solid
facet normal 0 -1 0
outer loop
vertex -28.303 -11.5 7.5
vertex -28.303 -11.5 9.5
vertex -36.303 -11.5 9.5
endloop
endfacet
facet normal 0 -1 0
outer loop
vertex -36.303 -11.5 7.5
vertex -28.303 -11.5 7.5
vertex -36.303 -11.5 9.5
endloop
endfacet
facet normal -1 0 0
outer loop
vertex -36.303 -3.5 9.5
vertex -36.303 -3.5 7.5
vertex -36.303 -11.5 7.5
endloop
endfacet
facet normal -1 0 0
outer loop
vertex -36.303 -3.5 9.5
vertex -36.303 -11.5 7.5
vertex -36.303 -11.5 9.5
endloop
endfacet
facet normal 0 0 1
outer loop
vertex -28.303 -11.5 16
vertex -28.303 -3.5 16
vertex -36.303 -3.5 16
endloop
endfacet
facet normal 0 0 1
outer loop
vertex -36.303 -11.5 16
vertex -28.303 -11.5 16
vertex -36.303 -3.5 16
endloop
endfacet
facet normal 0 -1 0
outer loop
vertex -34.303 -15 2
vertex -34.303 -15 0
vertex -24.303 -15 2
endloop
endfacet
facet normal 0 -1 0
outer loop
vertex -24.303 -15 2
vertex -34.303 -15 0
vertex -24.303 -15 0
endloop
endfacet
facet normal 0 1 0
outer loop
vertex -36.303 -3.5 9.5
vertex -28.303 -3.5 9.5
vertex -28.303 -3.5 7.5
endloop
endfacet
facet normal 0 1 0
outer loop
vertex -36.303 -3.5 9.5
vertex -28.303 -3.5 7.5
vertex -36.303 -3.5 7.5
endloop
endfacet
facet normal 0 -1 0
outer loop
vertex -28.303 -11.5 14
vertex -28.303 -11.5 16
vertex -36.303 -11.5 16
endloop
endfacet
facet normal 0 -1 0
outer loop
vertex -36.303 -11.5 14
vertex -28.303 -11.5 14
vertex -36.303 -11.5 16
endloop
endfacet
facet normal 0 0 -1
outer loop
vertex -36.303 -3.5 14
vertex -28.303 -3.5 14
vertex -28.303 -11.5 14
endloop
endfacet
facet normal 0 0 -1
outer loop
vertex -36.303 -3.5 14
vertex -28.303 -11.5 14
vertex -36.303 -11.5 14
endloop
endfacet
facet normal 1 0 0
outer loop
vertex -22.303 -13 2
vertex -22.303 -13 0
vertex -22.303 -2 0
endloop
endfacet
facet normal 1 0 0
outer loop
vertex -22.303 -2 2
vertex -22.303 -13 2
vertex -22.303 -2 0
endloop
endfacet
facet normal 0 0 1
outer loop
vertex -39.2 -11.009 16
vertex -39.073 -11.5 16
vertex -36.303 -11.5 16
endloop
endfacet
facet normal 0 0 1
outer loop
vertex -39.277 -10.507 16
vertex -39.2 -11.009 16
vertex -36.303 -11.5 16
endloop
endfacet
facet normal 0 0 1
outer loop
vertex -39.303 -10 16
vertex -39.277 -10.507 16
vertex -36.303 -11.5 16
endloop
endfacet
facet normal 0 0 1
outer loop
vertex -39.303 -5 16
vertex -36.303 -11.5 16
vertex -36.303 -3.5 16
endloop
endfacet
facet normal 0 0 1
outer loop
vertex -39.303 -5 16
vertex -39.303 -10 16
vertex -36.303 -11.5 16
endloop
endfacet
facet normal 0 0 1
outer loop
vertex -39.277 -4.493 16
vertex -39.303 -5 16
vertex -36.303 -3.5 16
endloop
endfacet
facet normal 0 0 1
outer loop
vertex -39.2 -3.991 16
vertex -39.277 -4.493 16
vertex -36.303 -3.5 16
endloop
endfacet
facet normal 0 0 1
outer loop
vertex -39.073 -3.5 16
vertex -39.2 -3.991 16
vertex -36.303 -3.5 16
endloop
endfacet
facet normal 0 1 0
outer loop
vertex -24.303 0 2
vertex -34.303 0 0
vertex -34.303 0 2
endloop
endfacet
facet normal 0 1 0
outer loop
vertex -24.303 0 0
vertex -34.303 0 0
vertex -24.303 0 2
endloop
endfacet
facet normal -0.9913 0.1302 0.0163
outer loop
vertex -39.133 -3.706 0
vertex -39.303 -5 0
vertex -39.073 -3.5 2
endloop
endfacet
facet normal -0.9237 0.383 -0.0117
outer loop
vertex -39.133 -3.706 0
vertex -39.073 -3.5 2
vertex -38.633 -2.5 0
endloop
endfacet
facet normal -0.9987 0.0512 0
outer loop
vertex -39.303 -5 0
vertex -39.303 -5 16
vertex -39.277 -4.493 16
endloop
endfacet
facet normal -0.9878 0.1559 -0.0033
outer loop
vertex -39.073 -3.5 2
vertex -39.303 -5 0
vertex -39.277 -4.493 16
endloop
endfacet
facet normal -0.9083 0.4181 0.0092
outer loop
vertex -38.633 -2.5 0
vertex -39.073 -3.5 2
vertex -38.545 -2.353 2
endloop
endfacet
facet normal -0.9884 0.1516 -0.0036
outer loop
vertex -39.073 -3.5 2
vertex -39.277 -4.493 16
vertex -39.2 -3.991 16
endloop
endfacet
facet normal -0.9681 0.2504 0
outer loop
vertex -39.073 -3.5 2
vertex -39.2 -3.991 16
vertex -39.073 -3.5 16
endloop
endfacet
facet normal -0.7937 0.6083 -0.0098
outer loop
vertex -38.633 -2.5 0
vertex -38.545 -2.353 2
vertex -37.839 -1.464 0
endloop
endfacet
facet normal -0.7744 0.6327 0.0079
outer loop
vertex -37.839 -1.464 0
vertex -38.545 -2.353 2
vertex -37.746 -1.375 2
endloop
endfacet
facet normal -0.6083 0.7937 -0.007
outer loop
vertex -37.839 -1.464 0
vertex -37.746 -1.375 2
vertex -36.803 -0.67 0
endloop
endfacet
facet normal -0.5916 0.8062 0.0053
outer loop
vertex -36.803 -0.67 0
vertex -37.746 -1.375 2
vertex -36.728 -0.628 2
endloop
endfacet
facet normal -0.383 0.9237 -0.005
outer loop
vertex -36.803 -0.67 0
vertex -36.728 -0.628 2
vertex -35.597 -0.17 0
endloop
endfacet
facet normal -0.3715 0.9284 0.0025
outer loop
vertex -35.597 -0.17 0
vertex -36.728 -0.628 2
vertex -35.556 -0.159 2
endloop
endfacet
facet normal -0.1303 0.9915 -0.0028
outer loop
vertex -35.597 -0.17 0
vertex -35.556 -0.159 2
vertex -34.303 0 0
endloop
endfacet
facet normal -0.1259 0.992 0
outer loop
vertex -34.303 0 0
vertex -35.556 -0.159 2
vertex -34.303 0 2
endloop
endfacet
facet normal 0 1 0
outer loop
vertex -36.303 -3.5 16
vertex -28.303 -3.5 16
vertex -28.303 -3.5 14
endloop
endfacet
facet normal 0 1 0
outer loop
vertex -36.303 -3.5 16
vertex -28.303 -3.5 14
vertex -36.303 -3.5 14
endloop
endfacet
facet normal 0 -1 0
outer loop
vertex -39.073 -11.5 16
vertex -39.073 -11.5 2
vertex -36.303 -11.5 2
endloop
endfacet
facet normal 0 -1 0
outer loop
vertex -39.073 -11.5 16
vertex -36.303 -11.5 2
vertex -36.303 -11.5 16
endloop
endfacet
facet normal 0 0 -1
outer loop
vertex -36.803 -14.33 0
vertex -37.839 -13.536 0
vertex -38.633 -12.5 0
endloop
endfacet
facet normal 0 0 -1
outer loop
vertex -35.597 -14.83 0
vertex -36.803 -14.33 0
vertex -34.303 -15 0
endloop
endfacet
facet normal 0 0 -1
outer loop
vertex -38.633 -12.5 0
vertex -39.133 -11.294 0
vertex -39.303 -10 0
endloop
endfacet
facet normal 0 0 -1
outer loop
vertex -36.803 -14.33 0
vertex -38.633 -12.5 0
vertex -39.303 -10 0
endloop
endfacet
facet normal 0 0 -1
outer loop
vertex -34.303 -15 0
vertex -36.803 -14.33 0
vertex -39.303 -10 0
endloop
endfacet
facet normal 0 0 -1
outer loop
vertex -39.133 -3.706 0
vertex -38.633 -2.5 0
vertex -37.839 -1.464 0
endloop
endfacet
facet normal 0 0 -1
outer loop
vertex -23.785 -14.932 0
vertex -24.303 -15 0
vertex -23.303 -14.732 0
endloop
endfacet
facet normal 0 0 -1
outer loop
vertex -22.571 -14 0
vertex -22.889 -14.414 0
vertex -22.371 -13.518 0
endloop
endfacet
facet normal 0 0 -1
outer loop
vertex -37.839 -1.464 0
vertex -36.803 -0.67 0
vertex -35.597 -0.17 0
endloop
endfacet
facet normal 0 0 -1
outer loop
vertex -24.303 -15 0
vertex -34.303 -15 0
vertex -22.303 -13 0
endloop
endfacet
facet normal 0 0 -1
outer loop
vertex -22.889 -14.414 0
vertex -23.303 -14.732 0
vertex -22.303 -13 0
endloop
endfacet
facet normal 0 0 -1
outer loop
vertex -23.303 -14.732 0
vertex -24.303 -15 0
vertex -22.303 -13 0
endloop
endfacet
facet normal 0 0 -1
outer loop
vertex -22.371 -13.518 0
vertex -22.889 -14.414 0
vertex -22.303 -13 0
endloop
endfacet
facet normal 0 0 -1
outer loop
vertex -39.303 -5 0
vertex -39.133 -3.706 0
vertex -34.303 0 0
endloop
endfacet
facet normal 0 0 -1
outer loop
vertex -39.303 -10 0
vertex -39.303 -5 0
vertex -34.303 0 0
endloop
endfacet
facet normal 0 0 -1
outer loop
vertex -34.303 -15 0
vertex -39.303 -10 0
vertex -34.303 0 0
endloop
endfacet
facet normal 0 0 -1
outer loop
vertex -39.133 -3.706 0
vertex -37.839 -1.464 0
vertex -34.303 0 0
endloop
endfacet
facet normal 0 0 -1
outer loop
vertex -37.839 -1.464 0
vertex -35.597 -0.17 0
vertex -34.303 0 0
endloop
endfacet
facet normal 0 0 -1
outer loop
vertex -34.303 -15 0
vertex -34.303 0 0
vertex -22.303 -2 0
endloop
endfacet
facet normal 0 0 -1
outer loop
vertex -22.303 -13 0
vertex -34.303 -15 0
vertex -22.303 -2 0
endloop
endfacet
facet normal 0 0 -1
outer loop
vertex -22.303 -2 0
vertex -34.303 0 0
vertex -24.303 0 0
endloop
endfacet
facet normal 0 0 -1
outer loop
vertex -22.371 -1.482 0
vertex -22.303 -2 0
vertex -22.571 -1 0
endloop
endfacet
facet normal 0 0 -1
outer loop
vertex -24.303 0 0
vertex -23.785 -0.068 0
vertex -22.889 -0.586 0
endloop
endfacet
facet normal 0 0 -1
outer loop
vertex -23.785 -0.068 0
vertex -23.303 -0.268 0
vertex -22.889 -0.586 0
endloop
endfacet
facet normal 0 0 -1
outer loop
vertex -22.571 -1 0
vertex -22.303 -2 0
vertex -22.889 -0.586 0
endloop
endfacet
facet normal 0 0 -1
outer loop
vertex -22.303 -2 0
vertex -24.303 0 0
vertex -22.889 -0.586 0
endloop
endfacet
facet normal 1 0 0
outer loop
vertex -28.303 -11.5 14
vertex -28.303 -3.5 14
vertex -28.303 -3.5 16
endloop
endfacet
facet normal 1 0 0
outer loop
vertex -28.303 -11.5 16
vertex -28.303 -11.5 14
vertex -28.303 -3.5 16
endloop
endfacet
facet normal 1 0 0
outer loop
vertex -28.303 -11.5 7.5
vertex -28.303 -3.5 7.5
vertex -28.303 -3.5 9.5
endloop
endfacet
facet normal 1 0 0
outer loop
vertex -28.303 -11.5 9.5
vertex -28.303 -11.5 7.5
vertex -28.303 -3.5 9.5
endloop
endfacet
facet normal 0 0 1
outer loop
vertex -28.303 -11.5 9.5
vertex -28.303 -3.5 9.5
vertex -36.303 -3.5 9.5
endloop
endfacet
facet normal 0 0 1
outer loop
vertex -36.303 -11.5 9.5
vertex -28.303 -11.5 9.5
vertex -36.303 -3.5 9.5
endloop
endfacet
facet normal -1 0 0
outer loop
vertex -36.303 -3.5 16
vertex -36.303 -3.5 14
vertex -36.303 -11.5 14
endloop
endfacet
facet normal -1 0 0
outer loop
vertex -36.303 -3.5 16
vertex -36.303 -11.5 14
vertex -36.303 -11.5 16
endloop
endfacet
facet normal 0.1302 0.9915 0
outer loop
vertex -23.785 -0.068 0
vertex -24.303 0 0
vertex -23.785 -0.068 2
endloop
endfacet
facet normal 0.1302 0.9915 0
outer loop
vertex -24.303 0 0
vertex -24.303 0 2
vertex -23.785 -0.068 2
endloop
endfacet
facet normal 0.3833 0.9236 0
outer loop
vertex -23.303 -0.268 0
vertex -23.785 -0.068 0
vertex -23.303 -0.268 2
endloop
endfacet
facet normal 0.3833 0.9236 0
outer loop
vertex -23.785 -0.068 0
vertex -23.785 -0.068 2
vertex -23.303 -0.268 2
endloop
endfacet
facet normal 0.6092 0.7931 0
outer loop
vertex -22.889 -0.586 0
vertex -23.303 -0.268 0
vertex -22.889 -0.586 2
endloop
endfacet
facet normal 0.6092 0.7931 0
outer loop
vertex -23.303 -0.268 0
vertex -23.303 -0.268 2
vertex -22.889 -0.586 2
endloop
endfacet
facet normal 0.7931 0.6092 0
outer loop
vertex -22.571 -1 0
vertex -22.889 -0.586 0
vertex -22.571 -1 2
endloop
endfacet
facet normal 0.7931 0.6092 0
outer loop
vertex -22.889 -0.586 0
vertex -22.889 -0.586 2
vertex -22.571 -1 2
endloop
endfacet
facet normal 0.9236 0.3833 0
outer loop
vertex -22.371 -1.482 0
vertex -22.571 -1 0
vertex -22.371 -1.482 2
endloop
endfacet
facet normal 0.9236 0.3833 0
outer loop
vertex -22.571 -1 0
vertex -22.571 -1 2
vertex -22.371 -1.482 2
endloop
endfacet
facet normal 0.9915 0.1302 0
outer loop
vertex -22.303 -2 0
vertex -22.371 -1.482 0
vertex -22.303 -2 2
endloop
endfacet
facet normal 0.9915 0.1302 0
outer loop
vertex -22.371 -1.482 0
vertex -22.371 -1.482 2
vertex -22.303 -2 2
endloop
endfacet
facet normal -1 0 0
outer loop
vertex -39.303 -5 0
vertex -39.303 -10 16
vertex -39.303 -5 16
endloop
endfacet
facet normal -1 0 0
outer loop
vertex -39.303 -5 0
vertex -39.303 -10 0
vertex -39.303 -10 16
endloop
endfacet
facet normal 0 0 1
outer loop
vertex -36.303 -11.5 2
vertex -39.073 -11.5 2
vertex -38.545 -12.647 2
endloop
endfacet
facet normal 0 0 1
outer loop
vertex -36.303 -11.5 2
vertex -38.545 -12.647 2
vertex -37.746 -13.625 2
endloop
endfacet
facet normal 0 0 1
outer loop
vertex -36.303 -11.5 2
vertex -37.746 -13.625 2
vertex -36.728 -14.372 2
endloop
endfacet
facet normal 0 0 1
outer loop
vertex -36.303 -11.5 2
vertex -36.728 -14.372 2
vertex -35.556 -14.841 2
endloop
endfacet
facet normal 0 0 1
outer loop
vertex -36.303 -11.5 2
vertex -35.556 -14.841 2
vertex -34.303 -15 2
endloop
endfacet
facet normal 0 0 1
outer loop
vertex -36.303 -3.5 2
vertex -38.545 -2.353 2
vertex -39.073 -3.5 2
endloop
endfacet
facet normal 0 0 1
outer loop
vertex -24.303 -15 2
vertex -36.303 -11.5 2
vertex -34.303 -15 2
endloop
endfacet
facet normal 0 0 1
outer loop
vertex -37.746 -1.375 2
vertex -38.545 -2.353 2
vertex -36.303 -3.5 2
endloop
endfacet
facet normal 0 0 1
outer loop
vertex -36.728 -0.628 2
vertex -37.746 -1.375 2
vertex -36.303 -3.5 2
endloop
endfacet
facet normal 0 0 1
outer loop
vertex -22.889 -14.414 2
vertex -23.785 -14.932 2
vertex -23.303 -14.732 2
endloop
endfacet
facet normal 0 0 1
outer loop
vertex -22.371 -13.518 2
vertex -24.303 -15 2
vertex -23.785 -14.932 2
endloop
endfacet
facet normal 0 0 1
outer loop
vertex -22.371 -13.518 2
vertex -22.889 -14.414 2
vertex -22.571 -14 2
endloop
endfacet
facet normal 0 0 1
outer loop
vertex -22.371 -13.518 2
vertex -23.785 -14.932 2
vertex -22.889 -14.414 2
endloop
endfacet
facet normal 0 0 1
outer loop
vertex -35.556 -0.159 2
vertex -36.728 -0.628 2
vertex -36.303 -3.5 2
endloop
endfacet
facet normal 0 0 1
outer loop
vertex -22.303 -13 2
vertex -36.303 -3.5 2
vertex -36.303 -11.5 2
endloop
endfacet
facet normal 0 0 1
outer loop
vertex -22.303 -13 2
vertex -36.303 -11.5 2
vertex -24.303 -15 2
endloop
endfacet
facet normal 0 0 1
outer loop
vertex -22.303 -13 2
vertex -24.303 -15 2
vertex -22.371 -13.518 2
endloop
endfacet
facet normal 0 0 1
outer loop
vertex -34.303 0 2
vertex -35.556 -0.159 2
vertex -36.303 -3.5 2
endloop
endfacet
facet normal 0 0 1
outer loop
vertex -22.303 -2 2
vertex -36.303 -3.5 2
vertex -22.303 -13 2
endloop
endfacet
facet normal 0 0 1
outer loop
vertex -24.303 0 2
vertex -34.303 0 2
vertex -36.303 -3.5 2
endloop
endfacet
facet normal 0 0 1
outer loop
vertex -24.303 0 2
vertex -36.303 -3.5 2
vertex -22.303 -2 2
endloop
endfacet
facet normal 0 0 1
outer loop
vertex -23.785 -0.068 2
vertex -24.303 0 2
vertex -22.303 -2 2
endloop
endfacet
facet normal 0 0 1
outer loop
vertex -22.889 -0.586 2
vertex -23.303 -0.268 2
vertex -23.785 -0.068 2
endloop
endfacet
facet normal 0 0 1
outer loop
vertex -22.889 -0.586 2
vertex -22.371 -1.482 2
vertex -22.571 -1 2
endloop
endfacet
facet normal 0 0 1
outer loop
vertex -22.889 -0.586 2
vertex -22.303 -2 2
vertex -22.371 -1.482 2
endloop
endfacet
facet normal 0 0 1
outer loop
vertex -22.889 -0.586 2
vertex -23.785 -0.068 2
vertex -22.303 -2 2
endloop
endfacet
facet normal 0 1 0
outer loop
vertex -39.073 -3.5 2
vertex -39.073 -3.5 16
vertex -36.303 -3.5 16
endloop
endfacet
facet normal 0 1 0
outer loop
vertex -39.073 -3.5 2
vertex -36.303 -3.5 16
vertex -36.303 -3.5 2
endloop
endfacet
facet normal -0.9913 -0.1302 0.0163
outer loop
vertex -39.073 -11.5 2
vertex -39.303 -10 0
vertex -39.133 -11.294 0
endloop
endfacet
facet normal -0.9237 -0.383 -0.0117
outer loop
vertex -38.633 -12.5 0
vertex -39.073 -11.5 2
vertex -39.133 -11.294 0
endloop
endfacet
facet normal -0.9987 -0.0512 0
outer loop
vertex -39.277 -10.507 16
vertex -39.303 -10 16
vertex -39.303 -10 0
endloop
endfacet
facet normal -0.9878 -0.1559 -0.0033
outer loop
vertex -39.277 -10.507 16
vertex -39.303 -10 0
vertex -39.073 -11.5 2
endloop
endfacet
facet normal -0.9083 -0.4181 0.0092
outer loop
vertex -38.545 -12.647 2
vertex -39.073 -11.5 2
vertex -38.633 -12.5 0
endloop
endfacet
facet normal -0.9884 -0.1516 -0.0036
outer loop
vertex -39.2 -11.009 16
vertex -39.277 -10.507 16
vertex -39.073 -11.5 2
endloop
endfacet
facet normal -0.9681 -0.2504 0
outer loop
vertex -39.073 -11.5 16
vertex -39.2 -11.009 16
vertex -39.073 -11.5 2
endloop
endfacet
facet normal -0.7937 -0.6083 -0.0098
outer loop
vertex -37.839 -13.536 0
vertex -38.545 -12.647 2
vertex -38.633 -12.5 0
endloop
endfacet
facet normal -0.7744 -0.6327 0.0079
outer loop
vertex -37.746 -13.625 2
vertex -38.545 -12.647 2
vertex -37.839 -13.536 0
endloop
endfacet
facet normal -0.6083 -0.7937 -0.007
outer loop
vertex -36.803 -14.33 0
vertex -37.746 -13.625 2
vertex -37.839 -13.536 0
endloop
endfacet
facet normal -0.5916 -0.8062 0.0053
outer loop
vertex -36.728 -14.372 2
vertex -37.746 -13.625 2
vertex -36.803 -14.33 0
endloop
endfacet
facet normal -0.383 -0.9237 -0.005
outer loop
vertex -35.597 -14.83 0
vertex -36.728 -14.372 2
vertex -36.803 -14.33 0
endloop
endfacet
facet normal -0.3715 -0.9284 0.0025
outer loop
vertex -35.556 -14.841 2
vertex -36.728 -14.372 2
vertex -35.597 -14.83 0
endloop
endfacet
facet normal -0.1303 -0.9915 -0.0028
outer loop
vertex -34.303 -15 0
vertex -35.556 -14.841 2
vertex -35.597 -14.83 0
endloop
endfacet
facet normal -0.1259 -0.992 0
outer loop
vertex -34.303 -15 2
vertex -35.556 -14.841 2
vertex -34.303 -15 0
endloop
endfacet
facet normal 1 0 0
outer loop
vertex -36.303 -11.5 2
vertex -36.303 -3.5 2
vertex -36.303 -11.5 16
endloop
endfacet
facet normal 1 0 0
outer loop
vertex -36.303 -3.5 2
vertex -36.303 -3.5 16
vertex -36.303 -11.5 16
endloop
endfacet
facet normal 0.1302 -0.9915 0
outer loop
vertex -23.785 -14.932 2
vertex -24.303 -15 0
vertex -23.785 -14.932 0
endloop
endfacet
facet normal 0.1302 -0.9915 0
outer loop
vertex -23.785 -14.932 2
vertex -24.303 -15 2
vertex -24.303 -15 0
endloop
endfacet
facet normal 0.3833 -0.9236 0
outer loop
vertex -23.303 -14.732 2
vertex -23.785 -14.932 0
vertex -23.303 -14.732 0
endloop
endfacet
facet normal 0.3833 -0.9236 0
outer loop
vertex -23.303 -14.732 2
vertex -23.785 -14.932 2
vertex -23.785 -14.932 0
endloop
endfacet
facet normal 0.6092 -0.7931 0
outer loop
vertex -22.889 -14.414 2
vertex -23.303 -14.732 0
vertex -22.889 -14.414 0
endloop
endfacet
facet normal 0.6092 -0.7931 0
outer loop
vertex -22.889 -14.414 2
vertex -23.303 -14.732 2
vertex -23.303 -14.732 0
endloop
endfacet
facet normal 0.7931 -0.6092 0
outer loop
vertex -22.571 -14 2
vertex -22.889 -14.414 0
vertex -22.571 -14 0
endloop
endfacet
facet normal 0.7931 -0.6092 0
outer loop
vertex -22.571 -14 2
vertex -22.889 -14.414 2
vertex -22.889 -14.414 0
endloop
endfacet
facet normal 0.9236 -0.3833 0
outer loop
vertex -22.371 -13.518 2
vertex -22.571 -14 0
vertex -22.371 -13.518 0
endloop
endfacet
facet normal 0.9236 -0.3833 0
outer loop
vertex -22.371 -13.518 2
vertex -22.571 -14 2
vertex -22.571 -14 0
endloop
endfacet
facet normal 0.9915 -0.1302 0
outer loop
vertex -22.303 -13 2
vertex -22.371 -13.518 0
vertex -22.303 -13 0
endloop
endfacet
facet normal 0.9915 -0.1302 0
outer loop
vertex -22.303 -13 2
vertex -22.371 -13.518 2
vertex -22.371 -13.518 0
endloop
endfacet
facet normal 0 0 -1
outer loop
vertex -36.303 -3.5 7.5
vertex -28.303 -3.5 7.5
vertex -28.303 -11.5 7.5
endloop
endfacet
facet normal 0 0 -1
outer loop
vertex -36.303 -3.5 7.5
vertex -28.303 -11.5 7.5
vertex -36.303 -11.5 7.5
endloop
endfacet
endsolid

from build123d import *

# Parameters (mm, degrees)
F0_W     = 17
F0_H     = 15
F1_DEPTH = 2
F3_DEPTH = 3
F4_W     = 8
F4_H     = 2
F5_DEPTH = 8
F6_R     = 5
F7_R     = 2


with BuildPart() as f1:
    # F0 (on Top) → F1 (new body)
    with BuildSketch(Plane.XY):
        with Locations((-30.8030308187, -7.5)):
            Rectangle(F0_W, F0_H)
    extrude(amount=F1_DEPTH)

    # F2 (on face) → F3 (join)
    with BuildSketch(Plane(origin=(-39.3030308187, 0, 0), x_dir=(0, -1, 0), z_dir=(-1, 0, 0))):
        Polygon((3.5, 2), (7.5, 2), (11.5, 2), (11.5, 16), (3.5, 16), align=None)
    extrude(amount=-F3_DEPTH)

    # F6
    f6_edges = [f1.edges().sort_by_distance(p)[0] for p in [
        (-39.303031, 0, 1),
        (-39.303031, -15, 1),
    ]]
    fillet(f6_edges, radius=F6_R)

    # F7
    f7_edges = [f1.edges().sort_by_distance(p)[0] for p in [
        (-22.303031, -15, 1),
        (-22.303031, 0, 1),
    ]]
    fillet(f7_edges, radius=F7_R)


with BuildPart() as f5:
    # F4 (on face) → F5 (new body)
    with BuildSketch(Plane(origin=(0, -3.5, 0), x_dir=(-1, 0, 0), z_dir=(0, 1, 0))):
        with Locations((32.3030308187, 8.5)):
            Rectangle(F4_W, F4_H)
    extrude(amount=-F5_DEPTH)


with BuildPart() as f5b:
    # F4 (on face) → F5, piece 2 (new body)
    with BuildSketch(Plane(origin=(0, -3.5, 0), x_dir=(-1, 0, 0), z_dir=(0, 1, 0))):
        with Locations((32.3030308187, 15)):
            Rectangle(F4_W, F4_H)
    extrude(amount=-F5_DEPTH)


solid = Compound([f1.part, f5.part, f5b.part])
